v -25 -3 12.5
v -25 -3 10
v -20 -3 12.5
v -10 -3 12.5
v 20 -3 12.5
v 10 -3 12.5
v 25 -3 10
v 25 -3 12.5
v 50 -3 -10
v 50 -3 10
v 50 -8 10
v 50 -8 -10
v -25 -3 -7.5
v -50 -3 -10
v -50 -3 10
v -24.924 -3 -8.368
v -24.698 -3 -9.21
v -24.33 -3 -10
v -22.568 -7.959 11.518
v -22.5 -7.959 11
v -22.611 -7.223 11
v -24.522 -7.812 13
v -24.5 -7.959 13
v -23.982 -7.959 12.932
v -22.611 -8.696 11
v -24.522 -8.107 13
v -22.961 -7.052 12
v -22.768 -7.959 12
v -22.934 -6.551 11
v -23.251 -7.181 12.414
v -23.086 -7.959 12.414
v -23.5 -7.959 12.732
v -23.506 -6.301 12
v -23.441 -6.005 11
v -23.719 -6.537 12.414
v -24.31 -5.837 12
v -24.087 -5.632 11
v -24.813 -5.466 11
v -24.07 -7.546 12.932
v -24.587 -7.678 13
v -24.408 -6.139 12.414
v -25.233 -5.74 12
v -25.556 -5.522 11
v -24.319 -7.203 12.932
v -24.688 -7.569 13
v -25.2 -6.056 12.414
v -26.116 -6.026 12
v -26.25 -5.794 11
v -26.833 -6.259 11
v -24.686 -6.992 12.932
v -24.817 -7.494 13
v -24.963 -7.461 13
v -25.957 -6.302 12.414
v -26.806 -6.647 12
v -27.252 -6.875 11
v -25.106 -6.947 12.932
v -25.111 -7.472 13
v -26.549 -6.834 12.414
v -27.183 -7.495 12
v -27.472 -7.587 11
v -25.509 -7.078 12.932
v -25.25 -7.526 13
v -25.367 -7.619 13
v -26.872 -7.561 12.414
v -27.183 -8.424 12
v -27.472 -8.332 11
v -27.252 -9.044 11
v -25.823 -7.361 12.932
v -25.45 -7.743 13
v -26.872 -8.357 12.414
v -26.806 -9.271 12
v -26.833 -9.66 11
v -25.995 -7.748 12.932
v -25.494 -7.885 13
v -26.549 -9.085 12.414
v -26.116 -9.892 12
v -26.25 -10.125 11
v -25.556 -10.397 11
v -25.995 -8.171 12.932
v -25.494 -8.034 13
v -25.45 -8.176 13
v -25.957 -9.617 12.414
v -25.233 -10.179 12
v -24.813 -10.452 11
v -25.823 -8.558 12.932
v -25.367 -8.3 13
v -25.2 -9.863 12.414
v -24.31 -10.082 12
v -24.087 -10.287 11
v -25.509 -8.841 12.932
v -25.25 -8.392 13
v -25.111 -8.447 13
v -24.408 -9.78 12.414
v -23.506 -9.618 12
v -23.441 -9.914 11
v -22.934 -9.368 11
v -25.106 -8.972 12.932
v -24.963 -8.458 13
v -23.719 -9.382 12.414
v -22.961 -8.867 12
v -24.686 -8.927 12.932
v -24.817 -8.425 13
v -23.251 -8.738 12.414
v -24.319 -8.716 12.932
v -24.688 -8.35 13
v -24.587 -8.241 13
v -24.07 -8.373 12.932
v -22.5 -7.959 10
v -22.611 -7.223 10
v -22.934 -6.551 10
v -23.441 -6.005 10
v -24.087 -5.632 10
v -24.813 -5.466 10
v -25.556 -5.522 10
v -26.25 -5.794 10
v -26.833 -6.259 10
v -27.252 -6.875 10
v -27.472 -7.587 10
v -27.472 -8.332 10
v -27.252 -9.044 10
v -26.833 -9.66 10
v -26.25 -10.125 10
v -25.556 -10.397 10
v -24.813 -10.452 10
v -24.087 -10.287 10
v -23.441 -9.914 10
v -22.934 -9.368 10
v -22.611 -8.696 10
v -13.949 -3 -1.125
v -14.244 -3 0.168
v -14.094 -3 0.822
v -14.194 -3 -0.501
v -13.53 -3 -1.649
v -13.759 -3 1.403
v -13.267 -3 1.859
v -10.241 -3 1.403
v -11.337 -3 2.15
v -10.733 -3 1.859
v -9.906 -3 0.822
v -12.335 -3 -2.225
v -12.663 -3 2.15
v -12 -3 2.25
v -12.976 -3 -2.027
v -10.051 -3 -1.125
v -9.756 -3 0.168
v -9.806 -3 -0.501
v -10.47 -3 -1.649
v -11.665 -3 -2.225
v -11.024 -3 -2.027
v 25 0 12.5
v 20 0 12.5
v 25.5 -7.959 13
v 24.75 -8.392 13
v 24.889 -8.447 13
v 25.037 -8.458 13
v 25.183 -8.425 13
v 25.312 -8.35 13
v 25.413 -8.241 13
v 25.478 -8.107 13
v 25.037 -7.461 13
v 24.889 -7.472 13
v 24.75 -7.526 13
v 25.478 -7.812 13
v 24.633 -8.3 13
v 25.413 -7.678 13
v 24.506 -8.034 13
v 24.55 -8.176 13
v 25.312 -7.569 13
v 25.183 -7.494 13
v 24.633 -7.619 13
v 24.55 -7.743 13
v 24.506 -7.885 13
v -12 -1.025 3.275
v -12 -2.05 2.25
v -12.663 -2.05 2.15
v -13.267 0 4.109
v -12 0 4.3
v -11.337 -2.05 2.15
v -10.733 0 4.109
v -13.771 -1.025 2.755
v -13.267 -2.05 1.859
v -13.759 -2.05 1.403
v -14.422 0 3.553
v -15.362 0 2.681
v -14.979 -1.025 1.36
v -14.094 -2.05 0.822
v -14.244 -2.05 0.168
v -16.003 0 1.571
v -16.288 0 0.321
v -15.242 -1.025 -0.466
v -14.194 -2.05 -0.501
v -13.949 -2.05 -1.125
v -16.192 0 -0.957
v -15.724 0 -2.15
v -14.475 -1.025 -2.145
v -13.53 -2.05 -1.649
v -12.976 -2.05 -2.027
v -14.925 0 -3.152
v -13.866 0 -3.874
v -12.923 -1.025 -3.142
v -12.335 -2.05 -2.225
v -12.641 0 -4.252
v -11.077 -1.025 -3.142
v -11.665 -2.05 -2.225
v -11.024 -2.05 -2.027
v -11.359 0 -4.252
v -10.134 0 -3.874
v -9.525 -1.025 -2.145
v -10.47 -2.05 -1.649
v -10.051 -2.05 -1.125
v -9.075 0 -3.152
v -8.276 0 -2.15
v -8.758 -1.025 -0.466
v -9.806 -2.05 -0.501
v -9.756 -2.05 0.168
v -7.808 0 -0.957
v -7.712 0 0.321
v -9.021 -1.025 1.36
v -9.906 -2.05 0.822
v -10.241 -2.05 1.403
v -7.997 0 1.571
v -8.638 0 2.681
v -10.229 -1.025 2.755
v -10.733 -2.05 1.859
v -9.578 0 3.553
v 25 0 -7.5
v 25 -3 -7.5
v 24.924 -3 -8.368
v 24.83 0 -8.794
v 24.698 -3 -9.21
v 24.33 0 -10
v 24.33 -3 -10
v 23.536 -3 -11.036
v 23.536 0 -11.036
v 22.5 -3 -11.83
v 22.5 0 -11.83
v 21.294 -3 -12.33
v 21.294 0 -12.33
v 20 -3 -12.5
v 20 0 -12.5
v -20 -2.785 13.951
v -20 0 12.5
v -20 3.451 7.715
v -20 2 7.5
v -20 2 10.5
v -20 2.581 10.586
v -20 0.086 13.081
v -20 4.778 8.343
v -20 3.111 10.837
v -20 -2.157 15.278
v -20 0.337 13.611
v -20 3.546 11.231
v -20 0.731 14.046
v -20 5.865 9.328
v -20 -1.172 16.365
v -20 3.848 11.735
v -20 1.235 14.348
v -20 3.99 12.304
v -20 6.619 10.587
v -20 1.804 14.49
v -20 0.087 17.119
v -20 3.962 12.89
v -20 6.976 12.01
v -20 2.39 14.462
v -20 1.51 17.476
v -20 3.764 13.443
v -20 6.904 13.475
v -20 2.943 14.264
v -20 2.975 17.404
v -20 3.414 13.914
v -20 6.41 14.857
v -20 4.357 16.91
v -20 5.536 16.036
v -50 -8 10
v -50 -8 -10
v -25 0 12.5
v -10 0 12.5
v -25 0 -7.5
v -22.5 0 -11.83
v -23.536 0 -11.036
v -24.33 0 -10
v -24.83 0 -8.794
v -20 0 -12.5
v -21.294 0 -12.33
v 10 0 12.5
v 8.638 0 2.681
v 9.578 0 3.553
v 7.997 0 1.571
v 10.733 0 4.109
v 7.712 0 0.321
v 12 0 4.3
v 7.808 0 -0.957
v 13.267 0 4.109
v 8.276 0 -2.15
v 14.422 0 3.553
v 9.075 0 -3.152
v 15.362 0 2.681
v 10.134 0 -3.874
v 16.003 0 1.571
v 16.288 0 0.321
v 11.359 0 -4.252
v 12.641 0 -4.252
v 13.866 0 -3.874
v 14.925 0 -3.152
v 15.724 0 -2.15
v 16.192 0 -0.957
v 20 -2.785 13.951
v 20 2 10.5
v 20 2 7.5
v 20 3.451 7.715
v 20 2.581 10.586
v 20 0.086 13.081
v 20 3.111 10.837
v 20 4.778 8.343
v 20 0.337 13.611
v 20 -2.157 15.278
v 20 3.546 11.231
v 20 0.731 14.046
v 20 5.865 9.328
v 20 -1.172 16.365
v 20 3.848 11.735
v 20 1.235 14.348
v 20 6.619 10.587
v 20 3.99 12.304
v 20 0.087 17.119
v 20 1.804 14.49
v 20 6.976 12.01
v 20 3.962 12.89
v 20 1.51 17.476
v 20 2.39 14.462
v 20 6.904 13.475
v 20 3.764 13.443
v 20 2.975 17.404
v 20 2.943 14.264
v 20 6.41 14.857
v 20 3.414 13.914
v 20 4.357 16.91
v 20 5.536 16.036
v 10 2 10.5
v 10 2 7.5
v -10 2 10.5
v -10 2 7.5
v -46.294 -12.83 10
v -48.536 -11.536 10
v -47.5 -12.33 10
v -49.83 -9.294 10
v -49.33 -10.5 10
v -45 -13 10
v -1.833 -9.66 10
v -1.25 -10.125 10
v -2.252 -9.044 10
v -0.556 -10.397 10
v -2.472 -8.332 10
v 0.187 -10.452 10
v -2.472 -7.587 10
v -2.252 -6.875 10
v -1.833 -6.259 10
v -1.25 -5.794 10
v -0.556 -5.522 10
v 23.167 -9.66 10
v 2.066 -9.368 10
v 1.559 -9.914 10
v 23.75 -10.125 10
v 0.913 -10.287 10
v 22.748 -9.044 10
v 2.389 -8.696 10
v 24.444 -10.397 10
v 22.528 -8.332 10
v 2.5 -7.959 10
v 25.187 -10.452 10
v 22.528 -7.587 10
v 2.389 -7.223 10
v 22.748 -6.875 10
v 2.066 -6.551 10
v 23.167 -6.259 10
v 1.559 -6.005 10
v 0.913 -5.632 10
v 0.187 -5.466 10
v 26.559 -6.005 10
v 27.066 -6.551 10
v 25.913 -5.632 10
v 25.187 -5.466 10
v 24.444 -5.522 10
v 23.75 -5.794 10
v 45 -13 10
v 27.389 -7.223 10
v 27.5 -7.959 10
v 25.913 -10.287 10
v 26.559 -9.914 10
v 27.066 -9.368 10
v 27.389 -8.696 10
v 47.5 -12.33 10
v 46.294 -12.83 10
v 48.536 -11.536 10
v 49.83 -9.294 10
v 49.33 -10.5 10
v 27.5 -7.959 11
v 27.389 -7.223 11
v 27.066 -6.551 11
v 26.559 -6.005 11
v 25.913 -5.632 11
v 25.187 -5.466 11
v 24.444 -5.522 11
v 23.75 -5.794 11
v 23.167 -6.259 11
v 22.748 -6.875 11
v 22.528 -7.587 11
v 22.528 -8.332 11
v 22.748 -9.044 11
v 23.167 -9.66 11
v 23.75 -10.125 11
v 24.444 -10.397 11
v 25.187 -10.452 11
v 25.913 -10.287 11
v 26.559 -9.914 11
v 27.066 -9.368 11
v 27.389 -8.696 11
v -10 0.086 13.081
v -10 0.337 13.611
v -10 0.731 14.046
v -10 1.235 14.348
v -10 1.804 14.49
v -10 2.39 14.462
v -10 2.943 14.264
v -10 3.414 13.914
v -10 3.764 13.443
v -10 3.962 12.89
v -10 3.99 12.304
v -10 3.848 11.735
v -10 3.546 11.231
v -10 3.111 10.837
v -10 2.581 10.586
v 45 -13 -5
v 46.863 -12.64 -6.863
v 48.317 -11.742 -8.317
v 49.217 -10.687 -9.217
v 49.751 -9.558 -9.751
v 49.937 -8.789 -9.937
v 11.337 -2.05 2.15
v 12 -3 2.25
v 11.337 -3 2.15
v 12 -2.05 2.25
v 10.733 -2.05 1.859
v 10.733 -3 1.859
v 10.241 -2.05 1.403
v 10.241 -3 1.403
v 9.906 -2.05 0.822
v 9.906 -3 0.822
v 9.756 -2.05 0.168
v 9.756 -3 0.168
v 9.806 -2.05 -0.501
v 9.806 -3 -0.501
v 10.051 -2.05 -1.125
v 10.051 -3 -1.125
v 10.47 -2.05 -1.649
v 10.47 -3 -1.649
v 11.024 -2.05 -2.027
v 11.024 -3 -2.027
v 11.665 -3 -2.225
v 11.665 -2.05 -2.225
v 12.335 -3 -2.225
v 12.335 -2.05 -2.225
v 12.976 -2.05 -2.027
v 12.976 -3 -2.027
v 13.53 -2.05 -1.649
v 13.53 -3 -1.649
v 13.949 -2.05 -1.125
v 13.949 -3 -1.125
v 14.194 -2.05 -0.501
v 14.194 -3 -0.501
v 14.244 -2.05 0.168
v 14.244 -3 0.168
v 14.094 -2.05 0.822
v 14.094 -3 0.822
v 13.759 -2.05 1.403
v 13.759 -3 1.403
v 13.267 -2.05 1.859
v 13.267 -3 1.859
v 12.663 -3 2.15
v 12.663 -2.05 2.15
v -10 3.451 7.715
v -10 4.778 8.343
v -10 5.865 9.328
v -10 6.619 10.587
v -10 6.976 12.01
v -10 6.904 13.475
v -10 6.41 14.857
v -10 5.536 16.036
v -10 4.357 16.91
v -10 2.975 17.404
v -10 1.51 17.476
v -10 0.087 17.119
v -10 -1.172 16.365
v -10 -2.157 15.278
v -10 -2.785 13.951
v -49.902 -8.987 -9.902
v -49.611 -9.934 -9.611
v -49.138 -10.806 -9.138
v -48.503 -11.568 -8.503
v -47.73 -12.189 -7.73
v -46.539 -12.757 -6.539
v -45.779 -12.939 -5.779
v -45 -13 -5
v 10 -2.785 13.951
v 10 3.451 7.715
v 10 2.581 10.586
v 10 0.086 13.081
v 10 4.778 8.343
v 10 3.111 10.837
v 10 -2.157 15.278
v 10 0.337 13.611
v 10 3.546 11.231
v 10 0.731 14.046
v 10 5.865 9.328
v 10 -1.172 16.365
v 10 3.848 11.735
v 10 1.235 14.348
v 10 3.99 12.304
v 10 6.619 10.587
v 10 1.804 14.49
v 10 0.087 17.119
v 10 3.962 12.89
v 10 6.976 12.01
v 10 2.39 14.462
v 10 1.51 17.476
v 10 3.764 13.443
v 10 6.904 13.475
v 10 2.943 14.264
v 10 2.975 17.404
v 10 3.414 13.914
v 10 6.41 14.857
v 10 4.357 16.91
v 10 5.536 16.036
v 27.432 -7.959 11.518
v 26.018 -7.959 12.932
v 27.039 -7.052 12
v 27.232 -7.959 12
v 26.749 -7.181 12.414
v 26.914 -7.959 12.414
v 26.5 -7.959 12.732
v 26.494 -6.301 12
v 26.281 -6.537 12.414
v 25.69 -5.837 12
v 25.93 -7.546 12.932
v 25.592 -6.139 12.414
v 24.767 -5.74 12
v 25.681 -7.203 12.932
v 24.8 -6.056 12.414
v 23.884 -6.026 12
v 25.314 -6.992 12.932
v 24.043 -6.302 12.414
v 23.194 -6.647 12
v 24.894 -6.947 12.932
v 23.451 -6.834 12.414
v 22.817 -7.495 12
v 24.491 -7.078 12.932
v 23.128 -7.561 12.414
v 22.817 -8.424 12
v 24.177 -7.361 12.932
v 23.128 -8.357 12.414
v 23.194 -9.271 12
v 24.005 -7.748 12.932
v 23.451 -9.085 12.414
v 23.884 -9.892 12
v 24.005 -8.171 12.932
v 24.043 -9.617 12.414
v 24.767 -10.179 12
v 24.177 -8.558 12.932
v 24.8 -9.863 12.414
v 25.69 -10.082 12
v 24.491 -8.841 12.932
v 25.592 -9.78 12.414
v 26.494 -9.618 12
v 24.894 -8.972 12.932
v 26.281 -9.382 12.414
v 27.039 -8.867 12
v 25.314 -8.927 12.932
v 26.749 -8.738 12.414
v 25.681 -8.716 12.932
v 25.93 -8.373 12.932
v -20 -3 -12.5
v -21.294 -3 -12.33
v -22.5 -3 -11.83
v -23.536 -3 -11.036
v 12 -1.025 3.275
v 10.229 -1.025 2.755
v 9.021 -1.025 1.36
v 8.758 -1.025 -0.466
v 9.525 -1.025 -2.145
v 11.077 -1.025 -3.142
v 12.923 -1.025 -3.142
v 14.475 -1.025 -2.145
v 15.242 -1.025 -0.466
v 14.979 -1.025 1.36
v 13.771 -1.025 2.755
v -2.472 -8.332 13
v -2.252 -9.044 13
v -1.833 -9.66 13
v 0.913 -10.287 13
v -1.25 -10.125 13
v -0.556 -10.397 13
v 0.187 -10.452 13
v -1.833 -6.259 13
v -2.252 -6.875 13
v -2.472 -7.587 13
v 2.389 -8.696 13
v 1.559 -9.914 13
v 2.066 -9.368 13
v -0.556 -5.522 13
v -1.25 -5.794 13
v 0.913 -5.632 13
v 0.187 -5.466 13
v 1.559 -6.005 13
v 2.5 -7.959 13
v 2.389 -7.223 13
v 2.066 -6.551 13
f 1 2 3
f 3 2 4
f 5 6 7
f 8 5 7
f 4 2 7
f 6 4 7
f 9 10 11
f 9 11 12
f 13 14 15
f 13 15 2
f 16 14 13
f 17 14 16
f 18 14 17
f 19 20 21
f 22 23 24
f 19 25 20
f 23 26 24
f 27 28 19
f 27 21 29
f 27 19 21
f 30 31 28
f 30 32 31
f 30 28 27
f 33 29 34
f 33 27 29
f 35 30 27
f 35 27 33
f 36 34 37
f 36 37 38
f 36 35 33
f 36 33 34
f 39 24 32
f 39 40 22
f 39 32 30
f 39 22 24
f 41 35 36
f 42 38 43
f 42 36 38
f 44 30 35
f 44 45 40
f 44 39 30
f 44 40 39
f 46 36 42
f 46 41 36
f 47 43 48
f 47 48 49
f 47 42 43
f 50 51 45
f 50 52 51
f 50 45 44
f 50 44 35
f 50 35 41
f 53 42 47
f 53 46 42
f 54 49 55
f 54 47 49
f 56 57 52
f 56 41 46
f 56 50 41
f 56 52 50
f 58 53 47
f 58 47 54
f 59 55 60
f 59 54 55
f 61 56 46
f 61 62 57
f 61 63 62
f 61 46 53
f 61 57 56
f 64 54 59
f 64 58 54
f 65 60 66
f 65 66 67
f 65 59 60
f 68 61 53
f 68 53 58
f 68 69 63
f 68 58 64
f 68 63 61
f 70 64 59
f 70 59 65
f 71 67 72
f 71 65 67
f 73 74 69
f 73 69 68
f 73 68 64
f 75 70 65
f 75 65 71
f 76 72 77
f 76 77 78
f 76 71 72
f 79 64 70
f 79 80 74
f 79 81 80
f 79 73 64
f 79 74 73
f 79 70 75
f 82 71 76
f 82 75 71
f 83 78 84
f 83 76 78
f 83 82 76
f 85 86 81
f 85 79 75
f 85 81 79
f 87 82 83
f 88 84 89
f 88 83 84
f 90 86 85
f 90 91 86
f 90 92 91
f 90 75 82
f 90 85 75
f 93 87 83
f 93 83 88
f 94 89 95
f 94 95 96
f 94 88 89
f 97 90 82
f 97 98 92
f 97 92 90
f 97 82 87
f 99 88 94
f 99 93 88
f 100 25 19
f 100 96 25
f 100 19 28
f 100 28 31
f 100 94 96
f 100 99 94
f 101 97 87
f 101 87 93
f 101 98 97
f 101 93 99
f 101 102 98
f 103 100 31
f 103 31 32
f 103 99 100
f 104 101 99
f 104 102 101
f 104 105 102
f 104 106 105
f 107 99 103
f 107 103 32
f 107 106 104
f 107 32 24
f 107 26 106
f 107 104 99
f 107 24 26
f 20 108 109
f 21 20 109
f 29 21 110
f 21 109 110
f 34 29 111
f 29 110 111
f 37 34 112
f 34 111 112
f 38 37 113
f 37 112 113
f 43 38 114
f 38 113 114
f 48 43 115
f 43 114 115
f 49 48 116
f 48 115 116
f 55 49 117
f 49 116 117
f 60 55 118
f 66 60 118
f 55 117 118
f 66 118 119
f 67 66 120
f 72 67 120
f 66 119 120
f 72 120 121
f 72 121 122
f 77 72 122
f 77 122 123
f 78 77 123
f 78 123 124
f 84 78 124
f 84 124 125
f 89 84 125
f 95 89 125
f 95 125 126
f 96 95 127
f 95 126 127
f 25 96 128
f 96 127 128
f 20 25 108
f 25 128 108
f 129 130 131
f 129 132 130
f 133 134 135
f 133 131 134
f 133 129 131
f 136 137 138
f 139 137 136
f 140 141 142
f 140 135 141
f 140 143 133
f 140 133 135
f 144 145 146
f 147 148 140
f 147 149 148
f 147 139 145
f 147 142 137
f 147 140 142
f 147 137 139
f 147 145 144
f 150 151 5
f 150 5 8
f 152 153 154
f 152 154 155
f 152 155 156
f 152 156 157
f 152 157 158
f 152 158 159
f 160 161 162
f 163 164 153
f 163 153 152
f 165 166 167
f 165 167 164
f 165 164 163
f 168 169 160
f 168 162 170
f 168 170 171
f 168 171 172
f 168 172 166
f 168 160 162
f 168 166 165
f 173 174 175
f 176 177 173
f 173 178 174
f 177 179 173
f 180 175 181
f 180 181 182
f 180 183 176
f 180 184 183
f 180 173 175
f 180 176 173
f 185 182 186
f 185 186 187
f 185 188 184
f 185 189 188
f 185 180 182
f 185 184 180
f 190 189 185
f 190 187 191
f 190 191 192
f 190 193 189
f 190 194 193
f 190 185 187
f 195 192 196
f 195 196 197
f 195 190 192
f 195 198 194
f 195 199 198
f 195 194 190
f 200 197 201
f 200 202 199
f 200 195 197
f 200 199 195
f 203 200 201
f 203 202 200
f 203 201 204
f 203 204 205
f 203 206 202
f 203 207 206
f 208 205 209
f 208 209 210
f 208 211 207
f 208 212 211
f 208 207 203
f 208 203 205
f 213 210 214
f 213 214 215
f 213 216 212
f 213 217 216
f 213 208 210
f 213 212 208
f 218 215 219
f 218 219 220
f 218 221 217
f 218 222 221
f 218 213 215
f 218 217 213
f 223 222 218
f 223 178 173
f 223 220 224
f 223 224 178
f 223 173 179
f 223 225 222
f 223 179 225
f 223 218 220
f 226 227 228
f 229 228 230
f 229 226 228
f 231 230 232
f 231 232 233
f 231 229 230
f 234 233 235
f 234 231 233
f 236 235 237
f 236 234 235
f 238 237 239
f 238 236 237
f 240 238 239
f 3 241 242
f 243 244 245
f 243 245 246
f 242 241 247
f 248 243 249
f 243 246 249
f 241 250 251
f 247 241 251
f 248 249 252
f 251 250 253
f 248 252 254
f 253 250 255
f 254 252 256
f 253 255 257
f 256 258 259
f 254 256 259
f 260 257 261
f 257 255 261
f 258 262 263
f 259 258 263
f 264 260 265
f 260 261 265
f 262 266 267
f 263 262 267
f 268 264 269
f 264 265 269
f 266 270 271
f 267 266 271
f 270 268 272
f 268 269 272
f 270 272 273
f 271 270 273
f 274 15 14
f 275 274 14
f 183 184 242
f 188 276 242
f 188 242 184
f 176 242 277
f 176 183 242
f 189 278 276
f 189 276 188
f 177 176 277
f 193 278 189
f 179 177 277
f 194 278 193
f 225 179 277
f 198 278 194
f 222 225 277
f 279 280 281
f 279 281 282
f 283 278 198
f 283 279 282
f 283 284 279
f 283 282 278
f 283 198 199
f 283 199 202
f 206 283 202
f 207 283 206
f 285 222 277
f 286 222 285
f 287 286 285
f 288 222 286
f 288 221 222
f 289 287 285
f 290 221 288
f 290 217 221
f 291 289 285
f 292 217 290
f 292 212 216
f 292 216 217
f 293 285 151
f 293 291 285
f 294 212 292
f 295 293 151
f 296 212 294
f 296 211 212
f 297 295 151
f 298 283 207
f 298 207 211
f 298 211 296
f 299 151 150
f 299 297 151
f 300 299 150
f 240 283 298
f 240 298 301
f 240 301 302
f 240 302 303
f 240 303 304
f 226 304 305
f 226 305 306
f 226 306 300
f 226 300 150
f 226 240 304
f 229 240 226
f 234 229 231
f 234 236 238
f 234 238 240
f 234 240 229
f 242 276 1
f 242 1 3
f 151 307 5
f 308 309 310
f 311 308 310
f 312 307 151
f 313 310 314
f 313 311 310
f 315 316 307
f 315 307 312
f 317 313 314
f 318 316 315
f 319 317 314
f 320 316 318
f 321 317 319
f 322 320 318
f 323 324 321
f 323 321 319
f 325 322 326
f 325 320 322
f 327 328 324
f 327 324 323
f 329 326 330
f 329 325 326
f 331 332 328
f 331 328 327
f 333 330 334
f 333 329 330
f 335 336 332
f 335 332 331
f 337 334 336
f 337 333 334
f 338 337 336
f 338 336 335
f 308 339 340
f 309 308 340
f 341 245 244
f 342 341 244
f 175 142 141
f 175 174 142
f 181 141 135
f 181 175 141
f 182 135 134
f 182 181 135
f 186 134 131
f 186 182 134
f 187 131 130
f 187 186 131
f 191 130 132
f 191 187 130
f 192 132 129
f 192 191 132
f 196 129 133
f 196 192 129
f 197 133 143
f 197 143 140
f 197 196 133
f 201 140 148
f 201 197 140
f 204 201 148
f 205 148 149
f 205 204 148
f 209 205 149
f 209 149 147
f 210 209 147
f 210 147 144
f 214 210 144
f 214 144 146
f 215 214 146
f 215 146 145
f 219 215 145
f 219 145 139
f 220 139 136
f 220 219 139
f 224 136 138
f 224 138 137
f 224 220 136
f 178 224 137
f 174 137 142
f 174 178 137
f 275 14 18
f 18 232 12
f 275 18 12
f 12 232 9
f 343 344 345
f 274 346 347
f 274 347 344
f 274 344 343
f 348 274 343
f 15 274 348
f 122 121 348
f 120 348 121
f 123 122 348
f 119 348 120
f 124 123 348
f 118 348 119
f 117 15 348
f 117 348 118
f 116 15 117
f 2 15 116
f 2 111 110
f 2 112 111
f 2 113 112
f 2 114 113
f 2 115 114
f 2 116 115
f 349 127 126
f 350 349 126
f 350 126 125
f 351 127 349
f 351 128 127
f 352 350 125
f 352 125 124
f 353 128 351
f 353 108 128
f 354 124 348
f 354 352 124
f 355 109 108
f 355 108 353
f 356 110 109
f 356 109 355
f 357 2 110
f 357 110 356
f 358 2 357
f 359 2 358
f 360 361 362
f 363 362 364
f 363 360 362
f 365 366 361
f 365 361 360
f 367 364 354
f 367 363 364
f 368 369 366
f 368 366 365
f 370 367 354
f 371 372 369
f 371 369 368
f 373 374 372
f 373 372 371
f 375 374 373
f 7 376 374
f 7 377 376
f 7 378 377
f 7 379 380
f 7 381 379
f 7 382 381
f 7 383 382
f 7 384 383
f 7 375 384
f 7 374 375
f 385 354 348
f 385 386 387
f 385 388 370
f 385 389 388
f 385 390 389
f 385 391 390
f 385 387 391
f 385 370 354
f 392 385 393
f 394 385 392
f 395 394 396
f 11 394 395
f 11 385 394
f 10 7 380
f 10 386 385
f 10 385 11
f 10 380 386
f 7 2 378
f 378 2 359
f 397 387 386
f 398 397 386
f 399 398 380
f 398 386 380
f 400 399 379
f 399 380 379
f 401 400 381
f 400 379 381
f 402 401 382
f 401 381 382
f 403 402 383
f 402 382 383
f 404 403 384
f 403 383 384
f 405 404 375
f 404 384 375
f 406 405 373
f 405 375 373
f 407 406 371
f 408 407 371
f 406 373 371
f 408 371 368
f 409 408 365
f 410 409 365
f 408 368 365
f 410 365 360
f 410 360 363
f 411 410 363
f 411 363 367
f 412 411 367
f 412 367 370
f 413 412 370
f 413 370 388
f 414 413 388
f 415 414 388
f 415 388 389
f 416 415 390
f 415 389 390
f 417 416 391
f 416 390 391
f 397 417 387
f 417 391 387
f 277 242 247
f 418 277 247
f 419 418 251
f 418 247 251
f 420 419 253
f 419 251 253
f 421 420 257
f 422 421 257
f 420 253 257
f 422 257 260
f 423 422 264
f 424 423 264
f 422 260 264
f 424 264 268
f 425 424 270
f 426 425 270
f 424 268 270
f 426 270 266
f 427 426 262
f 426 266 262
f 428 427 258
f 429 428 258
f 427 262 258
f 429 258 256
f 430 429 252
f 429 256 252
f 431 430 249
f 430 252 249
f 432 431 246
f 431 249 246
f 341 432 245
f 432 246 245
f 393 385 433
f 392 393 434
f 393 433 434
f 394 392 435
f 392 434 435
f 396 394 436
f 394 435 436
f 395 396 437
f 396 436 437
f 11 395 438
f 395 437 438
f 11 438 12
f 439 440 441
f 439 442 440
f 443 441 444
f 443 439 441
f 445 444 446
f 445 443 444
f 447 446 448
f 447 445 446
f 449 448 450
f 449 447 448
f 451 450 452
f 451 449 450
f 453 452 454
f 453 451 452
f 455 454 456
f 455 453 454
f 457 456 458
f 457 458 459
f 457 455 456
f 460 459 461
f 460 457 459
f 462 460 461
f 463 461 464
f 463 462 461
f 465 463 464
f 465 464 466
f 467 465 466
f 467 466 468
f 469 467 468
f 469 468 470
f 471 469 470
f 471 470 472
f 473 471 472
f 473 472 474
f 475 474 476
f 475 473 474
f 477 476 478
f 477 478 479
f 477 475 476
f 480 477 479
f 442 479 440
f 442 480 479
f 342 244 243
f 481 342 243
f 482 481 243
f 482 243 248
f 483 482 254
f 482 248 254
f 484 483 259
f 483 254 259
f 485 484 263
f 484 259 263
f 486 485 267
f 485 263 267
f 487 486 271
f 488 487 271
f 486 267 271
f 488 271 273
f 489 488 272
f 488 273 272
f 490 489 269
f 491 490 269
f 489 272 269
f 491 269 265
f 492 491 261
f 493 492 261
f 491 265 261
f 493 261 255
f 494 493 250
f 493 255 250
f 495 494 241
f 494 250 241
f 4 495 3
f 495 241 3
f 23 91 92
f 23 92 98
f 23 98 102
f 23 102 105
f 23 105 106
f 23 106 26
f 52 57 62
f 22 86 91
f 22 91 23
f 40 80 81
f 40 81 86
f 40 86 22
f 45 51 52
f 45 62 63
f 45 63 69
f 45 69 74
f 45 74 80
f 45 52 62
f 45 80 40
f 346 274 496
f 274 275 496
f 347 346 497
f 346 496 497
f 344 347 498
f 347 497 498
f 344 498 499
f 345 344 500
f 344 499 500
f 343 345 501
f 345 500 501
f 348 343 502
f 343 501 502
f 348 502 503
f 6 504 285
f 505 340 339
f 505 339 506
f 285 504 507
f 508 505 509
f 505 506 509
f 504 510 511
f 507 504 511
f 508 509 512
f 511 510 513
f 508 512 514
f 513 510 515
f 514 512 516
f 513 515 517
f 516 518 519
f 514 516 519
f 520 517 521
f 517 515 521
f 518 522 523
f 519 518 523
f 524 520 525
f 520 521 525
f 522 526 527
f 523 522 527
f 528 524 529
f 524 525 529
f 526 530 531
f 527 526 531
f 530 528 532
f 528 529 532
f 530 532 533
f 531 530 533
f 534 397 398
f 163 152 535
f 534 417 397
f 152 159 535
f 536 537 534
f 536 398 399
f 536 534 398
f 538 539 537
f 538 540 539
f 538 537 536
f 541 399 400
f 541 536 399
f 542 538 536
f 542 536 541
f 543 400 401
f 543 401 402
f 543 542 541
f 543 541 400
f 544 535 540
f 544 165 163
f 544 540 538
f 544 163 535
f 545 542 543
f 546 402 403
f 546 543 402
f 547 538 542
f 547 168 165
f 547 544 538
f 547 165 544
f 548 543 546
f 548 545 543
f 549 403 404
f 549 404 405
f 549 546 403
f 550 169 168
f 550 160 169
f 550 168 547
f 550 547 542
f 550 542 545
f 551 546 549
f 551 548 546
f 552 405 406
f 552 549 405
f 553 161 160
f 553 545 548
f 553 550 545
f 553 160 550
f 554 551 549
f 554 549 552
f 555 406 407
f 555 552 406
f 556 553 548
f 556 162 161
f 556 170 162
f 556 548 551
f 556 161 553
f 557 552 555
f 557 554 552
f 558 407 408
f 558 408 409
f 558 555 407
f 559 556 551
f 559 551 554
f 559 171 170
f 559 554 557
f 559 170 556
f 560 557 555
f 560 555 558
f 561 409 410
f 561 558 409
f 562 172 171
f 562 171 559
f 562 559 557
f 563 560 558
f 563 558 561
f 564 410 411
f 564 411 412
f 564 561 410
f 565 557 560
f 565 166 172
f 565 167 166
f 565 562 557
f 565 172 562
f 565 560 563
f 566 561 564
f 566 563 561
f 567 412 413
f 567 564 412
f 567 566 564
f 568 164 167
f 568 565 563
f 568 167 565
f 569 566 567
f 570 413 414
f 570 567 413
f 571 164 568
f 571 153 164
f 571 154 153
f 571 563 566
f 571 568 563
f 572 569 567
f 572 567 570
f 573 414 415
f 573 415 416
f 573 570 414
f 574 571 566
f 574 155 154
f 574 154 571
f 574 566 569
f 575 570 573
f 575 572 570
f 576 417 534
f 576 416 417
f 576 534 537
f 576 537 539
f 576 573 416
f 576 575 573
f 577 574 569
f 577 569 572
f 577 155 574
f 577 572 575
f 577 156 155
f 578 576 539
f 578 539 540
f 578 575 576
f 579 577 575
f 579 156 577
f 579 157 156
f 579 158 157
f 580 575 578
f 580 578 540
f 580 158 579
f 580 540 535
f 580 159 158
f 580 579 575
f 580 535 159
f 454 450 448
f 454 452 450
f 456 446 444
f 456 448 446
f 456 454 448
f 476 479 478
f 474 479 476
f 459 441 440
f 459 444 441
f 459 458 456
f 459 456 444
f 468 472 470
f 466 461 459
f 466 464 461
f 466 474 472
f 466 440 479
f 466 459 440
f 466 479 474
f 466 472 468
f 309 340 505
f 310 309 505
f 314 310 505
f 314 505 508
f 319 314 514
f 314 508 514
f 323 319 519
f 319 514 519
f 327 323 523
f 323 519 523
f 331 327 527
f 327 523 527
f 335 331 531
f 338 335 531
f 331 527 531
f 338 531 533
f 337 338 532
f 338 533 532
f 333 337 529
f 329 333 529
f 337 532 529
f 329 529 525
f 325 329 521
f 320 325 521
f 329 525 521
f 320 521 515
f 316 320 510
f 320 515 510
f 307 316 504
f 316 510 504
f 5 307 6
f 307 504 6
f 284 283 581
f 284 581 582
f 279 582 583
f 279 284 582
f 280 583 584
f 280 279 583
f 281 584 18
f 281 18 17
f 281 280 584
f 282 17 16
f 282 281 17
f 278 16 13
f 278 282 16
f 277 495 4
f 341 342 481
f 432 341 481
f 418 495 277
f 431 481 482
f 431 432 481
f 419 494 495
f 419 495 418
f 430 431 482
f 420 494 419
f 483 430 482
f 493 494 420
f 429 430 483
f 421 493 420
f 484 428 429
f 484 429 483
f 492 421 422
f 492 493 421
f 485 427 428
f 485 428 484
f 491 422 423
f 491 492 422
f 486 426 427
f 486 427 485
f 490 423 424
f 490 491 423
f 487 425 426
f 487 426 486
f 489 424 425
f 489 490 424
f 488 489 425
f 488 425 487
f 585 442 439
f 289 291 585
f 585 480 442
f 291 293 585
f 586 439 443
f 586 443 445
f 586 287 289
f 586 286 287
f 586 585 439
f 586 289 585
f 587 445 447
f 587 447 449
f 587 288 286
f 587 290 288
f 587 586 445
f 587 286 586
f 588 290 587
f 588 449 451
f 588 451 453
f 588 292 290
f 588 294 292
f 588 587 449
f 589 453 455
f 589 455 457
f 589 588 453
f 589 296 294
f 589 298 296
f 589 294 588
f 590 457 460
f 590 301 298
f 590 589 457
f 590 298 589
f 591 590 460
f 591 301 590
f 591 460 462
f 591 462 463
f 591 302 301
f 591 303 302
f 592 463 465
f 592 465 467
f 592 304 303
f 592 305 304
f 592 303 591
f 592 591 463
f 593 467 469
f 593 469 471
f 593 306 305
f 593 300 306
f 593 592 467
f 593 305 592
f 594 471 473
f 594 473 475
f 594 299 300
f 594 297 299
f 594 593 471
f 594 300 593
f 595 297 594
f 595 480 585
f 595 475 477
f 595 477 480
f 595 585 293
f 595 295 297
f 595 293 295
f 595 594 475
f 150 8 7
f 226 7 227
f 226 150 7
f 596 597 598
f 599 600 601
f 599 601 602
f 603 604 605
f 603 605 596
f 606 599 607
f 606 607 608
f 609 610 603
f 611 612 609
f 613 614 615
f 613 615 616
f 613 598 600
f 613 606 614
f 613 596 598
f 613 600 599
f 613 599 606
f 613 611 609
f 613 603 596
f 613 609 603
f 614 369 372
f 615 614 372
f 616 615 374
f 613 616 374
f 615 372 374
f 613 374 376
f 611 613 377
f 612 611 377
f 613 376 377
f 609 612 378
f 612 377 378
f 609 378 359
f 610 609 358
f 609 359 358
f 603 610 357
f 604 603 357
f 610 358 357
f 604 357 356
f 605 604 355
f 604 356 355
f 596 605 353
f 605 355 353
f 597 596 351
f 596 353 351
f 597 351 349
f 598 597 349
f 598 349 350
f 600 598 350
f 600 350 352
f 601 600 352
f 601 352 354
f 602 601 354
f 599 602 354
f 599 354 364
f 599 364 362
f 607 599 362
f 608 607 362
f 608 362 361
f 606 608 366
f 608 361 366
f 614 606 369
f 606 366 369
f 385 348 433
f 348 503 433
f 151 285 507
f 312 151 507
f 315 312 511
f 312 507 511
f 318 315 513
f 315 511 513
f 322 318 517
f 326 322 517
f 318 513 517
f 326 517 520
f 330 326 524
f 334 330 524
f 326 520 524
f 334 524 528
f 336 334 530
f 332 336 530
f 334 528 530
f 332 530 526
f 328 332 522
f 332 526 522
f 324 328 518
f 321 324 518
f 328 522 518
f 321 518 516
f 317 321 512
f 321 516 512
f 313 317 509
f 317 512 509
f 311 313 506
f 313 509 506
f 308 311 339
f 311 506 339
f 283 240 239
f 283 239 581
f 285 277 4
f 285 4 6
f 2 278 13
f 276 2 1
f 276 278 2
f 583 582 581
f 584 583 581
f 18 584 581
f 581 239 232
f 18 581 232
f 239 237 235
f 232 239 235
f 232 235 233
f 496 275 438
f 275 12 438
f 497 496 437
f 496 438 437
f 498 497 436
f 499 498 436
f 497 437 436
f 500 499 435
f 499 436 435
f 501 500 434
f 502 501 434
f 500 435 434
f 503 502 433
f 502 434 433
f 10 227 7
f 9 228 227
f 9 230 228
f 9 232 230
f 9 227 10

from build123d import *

# Parameters (mm, degrees)
SM_BASE_FLANGE_1_DEPTH   = 3
OTHER_START              = 10
OTHER_1_DEPTH            = 10
OTHER_START_2            = -20
OTHER_2_DEPTH            = 10
HOLE_WIZARD_1_AT_2_COUNT = 2
HOLE_WIZARD_1_AT_2_PITCH = 24
SKETCH_12_W              = 100
SKETCH_12_H              = 20
EXTRUDE_1_DEPTH          = 10
FILLET_1_R               = 5
SKETCH_13_R              = 2.5
EXTRUDE_2_DEPTH          = 3
FILLET_2_R               = 2


# Read off the part's stored shape, not the designer's step: 褶边1, 褶边2
# Sheet-metal steps are written as plain solids
with BuildPart() as part:
    # Sketch 1 → 基体-法兰1 (new body)
    with BuildSketch(Plane(origin=(0, 0, 0), x_dir=(1, 0, 0), z_dir=(0, 1, 0))):
        with BuildLine():
            Line((-25, -12.5), (25, -12.5))
            Line((25, -12.5), (25, 7.5))
            ThreePointArc((25, 7.5), (23.535533906, 11.035533906), (20, 12.5))
            Line((20, 12.5), (-20, 12.5))
            ThreePointArc((-20, 12.5), (-23.535533906, 11.035533906), (-25, 7.5))
            Line((-25, 7.5), (-25, -12.5))
        make_face()
    extrude(amount=-SM_BASE_FLANGE_1_DEPTH)

    # Other 1 outline → Other 1 (add)
    with BuildSketch(Plane.YZ.offset(OTHER_START)):
        with BuildLine():
            Line((2, 10.5), (2, 7.5))
            ThreePointArc((2, 7.5), (5.535533906, 16.035533906), (-3, 12.5))
            Line((-3, 12.5), (0, 12.5))
            ThreePointArc((0, 12.5), (3.414213562, 13.914213562), (2, 10.5))
        make_face()
    extrude(amount=OTHER_1_DEPTH)

    # Other 2 outline → Other 2 (add)
    with BuildSketch(Plane.YZ.offset(OTHER_START_2)):
        with BuildLine():
            Line((2, 10.5), (2, 7.5))
            ThreePointArc((2, 7.5), (5.535533906, 16.035533906), (-3, 12.5))
            Line((-3, 12.5), (0, 12.5))
            ThreePointArc((0, 12.5), (3.414213562, 13.914213562), (2, 10.5))
        make_face()
    extrude(amount=OTHER_2_DEPTH)

    # 草图11 → 打孔尺寸(%根据十字)槽半沉头木螺钉的类型1 (revolve, cut)
    with BuildSketch(Plane(origin=(-12, 0, 0), x_dir=(0, 0, 1), z_dir=(1, 0, 0))):
        Polygon((0, 0), (0, 3), (2.25, 3), (2.25, 2.05), (4.3, 0), align=None)
    hole_wizard_1 = revolve(axis=Axis((-12, 6.35, 0), (0, -1, 0)), mode=Mode.SUBTRACT)

    # 打孔尺寸(%根据十字)槽半沉头木螺钉的类型1 at 2: 打孔尺寸(%根据十字)槽半沉头木螺钉的类型1 ×2
    with Locations(*[(i * HOLE_WIZARD_1_AT_2_PITCH, 0, 0) for i in range(1, HOLE_WIZARD_1_AT_2_COUNT)]):
        add(hole_wizard_1, mode=Mode.SUBTRACT)

    # 草图12 → 凸台-拉伸1 (add)
    with BuildSketch(Plane(origin=(0, -3, 0), x_dir=(1, 0, 0), z_dir=(0, 1, 0))):
        Rectangle(SKETCH_12_W, SKETCH_12_H)
    extrude(amount=-EXTRUDE_1_DEPTH)

    # 圆角1
    fillet_1_edges = [part.edges().sort_by_distance(p)[0] for p in [
        (50, -13, 0),
        (-50, -13, 0),
        (0, -13, -10),
    ]]
    fillet(fillet_1_edges, radius=FILLET_1_R)

    # 草图13 → 凸台-拉伸2 (add)
    with BuildSketch(Plane.XY.offset(10)):
        with Locations((-25, -7.95945711)):
            Circle(SKETCH_13_R)
        with Locations((0, -7.95945711)):
            Circle(SKETCH_13_R)
        with Locations((25, -7.95945711)):
            Circle(SKETCH_13_R)
    extrude(amount=EXTRUDE_2_DEPTH)

    # 圆角2
    fillet_2_edges = [part.edges().sort_by_distance(p)[0] for p in [
        (22.5, -7.95945711, 13),
        (-27.5, -7.95945711, 13),
    ]]
    fillet(fillet_2_edges, radius=FILLET_2_R)


solid = part.part
